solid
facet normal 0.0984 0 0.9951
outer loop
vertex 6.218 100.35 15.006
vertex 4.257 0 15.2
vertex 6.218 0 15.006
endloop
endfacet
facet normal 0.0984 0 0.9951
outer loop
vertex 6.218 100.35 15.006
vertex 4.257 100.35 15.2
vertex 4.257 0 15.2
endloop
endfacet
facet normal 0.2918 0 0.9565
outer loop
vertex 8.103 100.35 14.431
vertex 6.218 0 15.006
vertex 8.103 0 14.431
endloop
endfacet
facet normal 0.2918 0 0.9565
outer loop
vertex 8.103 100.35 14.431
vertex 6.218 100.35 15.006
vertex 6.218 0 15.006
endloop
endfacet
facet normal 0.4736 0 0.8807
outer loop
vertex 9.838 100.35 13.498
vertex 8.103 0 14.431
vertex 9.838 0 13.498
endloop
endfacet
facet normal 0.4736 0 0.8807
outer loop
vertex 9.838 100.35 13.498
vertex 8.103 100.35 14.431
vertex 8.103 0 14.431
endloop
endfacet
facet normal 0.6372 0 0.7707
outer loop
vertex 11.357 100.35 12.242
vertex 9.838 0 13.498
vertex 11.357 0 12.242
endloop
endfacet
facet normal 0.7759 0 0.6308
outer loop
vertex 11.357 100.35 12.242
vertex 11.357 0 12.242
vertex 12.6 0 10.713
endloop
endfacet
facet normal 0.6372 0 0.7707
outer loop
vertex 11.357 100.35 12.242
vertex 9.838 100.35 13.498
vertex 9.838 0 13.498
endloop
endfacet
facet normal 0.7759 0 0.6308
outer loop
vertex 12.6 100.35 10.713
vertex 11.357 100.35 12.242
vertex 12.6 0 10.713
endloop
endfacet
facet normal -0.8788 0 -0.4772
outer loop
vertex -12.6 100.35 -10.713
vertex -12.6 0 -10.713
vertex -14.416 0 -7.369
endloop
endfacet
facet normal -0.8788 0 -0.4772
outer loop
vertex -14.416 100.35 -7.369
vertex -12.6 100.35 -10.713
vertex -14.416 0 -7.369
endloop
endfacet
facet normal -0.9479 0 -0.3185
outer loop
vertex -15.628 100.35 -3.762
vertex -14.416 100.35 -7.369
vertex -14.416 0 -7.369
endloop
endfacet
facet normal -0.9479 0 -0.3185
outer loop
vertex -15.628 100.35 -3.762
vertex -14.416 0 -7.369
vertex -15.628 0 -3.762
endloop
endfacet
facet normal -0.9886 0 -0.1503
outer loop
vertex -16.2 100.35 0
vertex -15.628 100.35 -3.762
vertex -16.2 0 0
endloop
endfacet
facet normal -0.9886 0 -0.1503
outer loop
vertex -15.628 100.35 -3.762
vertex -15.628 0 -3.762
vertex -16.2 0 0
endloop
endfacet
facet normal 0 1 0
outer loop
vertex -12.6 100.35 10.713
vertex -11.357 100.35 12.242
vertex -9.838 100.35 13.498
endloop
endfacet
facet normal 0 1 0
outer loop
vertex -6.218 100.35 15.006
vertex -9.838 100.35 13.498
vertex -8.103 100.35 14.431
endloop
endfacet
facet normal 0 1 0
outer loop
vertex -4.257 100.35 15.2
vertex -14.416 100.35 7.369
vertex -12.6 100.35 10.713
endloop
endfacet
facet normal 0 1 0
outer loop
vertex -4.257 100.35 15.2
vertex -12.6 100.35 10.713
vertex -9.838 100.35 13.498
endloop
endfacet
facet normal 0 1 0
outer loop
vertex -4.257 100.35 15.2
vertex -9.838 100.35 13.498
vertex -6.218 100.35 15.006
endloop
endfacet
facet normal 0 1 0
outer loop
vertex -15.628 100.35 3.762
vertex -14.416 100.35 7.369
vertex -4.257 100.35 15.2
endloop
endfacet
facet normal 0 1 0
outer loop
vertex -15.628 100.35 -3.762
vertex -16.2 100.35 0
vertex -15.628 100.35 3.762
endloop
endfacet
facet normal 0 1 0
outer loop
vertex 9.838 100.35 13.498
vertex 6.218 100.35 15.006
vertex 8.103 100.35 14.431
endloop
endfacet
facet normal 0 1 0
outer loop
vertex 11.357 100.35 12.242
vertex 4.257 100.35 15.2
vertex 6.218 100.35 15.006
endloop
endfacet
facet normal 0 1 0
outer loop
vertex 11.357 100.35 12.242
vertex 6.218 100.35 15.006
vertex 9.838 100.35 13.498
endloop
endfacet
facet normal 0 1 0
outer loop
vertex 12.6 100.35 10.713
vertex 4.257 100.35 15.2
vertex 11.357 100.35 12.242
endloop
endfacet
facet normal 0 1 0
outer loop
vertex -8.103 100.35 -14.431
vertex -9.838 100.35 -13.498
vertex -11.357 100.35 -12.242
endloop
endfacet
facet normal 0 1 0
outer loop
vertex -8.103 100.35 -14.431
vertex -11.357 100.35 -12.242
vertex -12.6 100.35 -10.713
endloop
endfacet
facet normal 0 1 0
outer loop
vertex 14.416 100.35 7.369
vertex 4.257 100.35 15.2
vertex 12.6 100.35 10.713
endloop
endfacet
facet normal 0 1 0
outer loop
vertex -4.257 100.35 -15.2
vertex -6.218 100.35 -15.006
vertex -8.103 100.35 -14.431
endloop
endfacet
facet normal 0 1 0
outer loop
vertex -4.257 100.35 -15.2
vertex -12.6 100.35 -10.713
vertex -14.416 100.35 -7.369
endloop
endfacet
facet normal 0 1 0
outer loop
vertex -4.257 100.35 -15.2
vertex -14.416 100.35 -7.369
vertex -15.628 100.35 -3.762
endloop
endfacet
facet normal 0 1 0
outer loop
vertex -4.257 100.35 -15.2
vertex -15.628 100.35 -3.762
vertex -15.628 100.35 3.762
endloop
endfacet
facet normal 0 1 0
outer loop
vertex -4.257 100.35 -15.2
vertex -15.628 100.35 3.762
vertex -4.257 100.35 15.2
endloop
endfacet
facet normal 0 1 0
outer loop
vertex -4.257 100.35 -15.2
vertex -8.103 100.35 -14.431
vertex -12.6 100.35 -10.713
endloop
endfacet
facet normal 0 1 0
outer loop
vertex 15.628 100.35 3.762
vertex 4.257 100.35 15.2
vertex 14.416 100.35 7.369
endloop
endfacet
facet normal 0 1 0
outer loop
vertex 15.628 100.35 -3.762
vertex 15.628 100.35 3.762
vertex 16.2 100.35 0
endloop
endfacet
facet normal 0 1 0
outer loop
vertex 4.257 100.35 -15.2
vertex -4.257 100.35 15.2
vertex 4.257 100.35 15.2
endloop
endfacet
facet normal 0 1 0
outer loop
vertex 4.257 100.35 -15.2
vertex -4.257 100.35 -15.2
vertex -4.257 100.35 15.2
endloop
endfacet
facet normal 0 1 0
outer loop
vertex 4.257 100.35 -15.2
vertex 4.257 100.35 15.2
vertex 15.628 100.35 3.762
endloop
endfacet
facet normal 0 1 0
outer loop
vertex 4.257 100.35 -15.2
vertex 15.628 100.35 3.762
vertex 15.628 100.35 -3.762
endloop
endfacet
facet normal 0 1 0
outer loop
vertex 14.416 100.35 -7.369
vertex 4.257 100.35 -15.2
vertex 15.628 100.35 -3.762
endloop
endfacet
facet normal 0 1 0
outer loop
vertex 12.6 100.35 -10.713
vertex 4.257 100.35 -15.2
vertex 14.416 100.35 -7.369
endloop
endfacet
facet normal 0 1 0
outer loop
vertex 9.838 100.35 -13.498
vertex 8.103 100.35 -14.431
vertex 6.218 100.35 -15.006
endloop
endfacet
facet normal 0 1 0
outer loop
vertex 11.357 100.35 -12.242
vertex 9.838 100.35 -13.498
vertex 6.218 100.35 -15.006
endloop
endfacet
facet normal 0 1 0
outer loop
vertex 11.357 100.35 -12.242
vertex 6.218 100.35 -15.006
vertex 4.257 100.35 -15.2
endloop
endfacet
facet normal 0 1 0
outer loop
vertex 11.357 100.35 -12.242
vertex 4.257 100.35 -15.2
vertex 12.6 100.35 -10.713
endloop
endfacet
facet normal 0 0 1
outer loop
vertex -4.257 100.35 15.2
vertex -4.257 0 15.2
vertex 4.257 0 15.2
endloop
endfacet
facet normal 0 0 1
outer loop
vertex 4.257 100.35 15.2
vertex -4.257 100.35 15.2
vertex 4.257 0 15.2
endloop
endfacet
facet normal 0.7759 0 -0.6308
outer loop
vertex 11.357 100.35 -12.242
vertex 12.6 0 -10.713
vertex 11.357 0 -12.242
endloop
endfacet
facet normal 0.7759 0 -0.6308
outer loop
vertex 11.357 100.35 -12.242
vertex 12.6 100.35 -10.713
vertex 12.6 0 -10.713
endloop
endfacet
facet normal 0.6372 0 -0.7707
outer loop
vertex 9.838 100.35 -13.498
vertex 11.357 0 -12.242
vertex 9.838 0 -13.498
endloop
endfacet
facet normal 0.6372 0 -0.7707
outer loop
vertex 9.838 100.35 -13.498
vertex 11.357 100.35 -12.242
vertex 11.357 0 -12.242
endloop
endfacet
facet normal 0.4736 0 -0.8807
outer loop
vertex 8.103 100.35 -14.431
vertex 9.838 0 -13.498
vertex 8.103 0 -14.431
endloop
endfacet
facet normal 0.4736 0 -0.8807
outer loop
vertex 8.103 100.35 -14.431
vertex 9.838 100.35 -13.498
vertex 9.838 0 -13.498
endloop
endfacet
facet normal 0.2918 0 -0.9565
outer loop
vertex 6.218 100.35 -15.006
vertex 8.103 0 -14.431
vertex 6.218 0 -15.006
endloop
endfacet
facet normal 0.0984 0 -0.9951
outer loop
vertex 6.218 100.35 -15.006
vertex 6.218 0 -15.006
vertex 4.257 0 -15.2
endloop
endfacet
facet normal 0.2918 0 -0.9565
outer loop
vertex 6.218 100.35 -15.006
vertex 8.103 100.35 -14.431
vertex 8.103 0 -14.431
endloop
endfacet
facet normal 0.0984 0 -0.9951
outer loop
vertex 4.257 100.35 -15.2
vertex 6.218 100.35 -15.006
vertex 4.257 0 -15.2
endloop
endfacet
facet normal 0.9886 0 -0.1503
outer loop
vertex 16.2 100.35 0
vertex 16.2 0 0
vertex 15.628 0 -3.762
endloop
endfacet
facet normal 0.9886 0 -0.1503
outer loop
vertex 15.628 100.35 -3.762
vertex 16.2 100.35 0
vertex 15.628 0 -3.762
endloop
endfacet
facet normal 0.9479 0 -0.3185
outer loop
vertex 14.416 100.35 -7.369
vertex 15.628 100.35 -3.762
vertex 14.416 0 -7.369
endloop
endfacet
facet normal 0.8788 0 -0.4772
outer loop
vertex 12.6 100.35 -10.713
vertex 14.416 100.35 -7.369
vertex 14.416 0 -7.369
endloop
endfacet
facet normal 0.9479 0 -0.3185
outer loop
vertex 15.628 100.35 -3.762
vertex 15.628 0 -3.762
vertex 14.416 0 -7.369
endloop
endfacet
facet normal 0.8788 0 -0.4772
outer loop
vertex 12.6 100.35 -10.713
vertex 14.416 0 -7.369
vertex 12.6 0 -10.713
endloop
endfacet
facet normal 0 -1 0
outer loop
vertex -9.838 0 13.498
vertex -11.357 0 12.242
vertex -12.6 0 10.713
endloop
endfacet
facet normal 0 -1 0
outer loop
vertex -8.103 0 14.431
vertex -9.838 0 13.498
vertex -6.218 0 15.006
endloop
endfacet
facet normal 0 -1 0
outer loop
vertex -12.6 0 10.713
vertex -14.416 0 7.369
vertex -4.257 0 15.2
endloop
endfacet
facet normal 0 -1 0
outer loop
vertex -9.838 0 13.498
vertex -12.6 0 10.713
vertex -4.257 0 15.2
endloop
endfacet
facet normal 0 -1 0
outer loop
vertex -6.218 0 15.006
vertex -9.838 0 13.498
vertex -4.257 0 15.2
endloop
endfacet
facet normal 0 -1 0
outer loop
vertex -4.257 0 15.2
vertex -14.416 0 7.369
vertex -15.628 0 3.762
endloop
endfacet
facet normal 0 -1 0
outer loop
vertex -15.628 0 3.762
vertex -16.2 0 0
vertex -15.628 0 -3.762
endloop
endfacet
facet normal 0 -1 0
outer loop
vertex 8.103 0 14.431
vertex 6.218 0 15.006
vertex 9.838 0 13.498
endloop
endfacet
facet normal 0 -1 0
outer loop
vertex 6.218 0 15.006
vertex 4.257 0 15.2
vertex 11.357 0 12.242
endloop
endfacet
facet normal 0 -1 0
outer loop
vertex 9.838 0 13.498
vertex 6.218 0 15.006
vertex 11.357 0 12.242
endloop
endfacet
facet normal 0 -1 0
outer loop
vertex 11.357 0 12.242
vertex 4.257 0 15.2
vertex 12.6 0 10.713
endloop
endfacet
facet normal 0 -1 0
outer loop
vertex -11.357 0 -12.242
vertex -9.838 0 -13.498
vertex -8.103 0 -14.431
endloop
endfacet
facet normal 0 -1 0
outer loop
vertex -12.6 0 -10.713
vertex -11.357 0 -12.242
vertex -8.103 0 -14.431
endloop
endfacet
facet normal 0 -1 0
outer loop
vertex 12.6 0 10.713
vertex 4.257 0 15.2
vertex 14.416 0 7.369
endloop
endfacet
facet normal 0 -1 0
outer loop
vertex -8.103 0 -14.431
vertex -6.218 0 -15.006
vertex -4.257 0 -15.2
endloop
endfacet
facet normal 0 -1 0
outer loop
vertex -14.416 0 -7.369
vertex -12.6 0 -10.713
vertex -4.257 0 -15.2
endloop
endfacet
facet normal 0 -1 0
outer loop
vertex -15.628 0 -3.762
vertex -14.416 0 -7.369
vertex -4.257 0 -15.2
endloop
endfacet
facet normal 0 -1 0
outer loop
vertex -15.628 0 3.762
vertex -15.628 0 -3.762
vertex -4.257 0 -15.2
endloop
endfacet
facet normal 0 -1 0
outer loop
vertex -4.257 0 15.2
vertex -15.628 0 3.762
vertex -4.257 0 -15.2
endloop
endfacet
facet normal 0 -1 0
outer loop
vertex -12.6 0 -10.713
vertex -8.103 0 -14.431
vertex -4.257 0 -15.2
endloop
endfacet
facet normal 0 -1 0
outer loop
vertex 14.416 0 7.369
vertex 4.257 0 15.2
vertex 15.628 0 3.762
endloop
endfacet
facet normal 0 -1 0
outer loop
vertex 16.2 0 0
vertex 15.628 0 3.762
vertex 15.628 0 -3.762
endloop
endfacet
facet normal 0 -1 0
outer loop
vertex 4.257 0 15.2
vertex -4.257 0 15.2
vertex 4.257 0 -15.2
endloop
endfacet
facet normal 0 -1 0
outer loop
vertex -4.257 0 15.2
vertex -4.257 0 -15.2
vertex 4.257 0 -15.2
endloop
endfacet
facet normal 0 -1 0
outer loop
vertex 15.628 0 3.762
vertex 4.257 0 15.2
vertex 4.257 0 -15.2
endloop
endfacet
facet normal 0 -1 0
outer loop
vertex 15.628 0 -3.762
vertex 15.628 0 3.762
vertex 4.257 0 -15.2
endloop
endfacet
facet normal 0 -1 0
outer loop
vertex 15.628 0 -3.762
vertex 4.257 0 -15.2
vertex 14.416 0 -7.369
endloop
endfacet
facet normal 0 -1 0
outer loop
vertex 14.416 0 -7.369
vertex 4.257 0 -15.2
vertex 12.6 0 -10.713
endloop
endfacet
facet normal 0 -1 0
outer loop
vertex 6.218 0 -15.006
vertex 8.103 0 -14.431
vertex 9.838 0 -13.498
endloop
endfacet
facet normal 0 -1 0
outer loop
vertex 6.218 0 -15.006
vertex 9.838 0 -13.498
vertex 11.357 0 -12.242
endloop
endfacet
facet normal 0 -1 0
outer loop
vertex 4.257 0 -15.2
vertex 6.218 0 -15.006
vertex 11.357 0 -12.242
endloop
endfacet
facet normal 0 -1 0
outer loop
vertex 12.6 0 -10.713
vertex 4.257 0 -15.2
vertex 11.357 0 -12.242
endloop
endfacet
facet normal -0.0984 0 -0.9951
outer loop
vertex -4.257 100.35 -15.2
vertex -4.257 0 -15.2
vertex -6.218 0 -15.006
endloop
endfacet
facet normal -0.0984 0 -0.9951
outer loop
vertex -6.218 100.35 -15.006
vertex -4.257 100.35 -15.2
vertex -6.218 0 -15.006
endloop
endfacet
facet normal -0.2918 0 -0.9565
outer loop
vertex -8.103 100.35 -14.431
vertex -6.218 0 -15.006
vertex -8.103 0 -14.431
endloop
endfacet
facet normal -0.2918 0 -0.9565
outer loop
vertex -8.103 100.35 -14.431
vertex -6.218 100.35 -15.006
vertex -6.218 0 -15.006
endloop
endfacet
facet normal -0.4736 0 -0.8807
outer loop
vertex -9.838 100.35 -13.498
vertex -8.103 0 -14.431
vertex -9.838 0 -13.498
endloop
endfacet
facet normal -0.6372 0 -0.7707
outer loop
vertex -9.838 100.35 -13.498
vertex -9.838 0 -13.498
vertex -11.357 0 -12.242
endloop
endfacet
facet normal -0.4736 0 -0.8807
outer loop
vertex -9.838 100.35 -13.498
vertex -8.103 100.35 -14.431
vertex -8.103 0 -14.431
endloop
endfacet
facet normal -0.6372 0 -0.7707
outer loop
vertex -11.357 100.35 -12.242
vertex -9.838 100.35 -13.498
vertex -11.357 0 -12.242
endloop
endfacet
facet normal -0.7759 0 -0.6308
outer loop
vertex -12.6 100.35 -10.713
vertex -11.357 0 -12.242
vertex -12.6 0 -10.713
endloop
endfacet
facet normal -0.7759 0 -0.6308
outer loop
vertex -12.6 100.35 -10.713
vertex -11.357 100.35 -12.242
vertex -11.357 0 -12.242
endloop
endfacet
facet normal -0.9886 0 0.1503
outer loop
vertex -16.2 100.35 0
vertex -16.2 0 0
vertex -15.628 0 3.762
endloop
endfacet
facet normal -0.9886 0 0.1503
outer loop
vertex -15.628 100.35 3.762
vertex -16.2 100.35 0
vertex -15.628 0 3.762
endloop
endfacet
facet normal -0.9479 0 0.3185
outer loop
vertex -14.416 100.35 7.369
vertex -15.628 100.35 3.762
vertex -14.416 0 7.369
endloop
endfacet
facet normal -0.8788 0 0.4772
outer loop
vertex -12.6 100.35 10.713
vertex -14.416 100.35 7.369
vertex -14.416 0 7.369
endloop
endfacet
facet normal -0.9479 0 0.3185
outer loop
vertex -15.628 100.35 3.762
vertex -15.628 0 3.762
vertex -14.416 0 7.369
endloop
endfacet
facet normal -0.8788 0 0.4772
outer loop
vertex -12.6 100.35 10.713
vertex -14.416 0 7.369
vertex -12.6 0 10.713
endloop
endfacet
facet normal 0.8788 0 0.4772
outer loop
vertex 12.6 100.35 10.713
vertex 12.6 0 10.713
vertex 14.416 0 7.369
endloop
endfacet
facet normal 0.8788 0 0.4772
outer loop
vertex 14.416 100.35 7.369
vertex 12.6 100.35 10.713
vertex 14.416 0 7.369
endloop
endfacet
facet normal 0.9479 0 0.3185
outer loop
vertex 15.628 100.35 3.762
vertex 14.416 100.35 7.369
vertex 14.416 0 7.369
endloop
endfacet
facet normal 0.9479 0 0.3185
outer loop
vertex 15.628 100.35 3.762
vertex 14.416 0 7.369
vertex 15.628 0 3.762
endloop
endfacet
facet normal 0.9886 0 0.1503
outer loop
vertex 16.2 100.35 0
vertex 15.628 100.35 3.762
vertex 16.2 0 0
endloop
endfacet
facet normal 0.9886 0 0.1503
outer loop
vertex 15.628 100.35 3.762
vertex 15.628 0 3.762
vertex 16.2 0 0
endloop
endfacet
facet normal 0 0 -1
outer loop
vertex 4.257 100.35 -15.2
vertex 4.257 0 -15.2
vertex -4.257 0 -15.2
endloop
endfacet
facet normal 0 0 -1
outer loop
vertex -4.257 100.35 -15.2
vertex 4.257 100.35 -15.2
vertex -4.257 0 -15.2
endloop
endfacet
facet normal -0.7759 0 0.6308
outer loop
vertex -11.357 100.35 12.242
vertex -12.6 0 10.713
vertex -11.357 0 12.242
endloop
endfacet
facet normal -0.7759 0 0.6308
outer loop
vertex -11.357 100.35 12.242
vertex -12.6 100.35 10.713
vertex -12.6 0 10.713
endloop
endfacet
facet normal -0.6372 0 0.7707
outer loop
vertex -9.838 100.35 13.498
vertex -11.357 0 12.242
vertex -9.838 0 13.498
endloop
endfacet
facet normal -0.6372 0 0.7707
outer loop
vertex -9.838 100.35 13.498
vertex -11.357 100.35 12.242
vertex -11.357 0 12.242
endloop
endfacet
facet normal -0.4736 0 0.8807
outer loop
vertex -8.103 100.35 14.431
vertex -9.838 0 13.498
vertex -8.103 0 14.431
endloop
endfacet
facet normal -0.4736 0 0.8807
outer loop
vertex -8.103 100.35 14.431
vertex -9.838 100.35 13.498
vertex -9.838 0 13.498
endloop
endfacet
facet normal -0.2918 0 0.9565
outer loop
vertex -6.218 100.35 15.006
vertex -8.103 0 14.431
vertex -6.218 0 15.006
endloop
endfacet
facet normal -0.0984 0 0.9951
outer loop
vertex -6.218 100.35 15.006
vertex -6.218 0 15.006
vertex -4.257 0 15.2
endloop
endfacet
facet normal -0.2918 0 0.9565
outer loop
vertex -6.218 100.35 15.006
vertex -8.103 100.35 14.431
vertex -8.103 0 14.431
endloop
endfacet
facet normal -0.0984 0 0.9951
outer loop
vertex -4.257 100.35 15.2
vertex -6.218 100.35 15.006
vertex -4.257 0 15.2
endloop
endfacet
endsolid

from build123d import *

# Parameters (mm, degrees)
BOSS_EXTRUDE1_DEPTH = 100.35
FILLET1_R           = 10


with BuildPart() as part:
    # Sketch1 → Boss-Extrude1 (new body)
    with BuildSketch(Plane(origin=(0, 0, 0), x_dir=(1, 0, 0), z_dir=(0, 1, 0))):
        with BuildLine():
            ThreePointArc((-16.2, 0), (-13.956480682, -8.355560366), (-8.664749957, -15.2))
            Line((-8.664749957, -15.2), (8.664749957, -15.2))
            ThreePointArc((8.664749957, -15.2), (13.956480682, -8.355560366), (16.2, 0))
            ThreePointArc((16.2, 0), (13.956480682, 8.355560366), (8.664749957, 15.2))
            Line((8.664749957, 15.2), (-8.664749957, 15.2))
            ThreePointArc((-8.664749957, 15.2), (-13.956480682, 8.355560366), (-16.2, 0))
        make_face()
    extrude(amount=BOSS_EXTRUDE1_DEPTH)

    # Fillet1
    fillet1_edges = [part.edges().sort_by_distance(p)[0] for p in [
        (8.664749957, 50.175, 15.2),
        (-8.664749957, 50.175, 15.2),
        (-8.664749957, 50.175, -15.2),
        (8.664749957, 50.175, -15.2),
    ]]
    fillet(fillet1_edges, radius=FILLET1_R)


solid = part.part
